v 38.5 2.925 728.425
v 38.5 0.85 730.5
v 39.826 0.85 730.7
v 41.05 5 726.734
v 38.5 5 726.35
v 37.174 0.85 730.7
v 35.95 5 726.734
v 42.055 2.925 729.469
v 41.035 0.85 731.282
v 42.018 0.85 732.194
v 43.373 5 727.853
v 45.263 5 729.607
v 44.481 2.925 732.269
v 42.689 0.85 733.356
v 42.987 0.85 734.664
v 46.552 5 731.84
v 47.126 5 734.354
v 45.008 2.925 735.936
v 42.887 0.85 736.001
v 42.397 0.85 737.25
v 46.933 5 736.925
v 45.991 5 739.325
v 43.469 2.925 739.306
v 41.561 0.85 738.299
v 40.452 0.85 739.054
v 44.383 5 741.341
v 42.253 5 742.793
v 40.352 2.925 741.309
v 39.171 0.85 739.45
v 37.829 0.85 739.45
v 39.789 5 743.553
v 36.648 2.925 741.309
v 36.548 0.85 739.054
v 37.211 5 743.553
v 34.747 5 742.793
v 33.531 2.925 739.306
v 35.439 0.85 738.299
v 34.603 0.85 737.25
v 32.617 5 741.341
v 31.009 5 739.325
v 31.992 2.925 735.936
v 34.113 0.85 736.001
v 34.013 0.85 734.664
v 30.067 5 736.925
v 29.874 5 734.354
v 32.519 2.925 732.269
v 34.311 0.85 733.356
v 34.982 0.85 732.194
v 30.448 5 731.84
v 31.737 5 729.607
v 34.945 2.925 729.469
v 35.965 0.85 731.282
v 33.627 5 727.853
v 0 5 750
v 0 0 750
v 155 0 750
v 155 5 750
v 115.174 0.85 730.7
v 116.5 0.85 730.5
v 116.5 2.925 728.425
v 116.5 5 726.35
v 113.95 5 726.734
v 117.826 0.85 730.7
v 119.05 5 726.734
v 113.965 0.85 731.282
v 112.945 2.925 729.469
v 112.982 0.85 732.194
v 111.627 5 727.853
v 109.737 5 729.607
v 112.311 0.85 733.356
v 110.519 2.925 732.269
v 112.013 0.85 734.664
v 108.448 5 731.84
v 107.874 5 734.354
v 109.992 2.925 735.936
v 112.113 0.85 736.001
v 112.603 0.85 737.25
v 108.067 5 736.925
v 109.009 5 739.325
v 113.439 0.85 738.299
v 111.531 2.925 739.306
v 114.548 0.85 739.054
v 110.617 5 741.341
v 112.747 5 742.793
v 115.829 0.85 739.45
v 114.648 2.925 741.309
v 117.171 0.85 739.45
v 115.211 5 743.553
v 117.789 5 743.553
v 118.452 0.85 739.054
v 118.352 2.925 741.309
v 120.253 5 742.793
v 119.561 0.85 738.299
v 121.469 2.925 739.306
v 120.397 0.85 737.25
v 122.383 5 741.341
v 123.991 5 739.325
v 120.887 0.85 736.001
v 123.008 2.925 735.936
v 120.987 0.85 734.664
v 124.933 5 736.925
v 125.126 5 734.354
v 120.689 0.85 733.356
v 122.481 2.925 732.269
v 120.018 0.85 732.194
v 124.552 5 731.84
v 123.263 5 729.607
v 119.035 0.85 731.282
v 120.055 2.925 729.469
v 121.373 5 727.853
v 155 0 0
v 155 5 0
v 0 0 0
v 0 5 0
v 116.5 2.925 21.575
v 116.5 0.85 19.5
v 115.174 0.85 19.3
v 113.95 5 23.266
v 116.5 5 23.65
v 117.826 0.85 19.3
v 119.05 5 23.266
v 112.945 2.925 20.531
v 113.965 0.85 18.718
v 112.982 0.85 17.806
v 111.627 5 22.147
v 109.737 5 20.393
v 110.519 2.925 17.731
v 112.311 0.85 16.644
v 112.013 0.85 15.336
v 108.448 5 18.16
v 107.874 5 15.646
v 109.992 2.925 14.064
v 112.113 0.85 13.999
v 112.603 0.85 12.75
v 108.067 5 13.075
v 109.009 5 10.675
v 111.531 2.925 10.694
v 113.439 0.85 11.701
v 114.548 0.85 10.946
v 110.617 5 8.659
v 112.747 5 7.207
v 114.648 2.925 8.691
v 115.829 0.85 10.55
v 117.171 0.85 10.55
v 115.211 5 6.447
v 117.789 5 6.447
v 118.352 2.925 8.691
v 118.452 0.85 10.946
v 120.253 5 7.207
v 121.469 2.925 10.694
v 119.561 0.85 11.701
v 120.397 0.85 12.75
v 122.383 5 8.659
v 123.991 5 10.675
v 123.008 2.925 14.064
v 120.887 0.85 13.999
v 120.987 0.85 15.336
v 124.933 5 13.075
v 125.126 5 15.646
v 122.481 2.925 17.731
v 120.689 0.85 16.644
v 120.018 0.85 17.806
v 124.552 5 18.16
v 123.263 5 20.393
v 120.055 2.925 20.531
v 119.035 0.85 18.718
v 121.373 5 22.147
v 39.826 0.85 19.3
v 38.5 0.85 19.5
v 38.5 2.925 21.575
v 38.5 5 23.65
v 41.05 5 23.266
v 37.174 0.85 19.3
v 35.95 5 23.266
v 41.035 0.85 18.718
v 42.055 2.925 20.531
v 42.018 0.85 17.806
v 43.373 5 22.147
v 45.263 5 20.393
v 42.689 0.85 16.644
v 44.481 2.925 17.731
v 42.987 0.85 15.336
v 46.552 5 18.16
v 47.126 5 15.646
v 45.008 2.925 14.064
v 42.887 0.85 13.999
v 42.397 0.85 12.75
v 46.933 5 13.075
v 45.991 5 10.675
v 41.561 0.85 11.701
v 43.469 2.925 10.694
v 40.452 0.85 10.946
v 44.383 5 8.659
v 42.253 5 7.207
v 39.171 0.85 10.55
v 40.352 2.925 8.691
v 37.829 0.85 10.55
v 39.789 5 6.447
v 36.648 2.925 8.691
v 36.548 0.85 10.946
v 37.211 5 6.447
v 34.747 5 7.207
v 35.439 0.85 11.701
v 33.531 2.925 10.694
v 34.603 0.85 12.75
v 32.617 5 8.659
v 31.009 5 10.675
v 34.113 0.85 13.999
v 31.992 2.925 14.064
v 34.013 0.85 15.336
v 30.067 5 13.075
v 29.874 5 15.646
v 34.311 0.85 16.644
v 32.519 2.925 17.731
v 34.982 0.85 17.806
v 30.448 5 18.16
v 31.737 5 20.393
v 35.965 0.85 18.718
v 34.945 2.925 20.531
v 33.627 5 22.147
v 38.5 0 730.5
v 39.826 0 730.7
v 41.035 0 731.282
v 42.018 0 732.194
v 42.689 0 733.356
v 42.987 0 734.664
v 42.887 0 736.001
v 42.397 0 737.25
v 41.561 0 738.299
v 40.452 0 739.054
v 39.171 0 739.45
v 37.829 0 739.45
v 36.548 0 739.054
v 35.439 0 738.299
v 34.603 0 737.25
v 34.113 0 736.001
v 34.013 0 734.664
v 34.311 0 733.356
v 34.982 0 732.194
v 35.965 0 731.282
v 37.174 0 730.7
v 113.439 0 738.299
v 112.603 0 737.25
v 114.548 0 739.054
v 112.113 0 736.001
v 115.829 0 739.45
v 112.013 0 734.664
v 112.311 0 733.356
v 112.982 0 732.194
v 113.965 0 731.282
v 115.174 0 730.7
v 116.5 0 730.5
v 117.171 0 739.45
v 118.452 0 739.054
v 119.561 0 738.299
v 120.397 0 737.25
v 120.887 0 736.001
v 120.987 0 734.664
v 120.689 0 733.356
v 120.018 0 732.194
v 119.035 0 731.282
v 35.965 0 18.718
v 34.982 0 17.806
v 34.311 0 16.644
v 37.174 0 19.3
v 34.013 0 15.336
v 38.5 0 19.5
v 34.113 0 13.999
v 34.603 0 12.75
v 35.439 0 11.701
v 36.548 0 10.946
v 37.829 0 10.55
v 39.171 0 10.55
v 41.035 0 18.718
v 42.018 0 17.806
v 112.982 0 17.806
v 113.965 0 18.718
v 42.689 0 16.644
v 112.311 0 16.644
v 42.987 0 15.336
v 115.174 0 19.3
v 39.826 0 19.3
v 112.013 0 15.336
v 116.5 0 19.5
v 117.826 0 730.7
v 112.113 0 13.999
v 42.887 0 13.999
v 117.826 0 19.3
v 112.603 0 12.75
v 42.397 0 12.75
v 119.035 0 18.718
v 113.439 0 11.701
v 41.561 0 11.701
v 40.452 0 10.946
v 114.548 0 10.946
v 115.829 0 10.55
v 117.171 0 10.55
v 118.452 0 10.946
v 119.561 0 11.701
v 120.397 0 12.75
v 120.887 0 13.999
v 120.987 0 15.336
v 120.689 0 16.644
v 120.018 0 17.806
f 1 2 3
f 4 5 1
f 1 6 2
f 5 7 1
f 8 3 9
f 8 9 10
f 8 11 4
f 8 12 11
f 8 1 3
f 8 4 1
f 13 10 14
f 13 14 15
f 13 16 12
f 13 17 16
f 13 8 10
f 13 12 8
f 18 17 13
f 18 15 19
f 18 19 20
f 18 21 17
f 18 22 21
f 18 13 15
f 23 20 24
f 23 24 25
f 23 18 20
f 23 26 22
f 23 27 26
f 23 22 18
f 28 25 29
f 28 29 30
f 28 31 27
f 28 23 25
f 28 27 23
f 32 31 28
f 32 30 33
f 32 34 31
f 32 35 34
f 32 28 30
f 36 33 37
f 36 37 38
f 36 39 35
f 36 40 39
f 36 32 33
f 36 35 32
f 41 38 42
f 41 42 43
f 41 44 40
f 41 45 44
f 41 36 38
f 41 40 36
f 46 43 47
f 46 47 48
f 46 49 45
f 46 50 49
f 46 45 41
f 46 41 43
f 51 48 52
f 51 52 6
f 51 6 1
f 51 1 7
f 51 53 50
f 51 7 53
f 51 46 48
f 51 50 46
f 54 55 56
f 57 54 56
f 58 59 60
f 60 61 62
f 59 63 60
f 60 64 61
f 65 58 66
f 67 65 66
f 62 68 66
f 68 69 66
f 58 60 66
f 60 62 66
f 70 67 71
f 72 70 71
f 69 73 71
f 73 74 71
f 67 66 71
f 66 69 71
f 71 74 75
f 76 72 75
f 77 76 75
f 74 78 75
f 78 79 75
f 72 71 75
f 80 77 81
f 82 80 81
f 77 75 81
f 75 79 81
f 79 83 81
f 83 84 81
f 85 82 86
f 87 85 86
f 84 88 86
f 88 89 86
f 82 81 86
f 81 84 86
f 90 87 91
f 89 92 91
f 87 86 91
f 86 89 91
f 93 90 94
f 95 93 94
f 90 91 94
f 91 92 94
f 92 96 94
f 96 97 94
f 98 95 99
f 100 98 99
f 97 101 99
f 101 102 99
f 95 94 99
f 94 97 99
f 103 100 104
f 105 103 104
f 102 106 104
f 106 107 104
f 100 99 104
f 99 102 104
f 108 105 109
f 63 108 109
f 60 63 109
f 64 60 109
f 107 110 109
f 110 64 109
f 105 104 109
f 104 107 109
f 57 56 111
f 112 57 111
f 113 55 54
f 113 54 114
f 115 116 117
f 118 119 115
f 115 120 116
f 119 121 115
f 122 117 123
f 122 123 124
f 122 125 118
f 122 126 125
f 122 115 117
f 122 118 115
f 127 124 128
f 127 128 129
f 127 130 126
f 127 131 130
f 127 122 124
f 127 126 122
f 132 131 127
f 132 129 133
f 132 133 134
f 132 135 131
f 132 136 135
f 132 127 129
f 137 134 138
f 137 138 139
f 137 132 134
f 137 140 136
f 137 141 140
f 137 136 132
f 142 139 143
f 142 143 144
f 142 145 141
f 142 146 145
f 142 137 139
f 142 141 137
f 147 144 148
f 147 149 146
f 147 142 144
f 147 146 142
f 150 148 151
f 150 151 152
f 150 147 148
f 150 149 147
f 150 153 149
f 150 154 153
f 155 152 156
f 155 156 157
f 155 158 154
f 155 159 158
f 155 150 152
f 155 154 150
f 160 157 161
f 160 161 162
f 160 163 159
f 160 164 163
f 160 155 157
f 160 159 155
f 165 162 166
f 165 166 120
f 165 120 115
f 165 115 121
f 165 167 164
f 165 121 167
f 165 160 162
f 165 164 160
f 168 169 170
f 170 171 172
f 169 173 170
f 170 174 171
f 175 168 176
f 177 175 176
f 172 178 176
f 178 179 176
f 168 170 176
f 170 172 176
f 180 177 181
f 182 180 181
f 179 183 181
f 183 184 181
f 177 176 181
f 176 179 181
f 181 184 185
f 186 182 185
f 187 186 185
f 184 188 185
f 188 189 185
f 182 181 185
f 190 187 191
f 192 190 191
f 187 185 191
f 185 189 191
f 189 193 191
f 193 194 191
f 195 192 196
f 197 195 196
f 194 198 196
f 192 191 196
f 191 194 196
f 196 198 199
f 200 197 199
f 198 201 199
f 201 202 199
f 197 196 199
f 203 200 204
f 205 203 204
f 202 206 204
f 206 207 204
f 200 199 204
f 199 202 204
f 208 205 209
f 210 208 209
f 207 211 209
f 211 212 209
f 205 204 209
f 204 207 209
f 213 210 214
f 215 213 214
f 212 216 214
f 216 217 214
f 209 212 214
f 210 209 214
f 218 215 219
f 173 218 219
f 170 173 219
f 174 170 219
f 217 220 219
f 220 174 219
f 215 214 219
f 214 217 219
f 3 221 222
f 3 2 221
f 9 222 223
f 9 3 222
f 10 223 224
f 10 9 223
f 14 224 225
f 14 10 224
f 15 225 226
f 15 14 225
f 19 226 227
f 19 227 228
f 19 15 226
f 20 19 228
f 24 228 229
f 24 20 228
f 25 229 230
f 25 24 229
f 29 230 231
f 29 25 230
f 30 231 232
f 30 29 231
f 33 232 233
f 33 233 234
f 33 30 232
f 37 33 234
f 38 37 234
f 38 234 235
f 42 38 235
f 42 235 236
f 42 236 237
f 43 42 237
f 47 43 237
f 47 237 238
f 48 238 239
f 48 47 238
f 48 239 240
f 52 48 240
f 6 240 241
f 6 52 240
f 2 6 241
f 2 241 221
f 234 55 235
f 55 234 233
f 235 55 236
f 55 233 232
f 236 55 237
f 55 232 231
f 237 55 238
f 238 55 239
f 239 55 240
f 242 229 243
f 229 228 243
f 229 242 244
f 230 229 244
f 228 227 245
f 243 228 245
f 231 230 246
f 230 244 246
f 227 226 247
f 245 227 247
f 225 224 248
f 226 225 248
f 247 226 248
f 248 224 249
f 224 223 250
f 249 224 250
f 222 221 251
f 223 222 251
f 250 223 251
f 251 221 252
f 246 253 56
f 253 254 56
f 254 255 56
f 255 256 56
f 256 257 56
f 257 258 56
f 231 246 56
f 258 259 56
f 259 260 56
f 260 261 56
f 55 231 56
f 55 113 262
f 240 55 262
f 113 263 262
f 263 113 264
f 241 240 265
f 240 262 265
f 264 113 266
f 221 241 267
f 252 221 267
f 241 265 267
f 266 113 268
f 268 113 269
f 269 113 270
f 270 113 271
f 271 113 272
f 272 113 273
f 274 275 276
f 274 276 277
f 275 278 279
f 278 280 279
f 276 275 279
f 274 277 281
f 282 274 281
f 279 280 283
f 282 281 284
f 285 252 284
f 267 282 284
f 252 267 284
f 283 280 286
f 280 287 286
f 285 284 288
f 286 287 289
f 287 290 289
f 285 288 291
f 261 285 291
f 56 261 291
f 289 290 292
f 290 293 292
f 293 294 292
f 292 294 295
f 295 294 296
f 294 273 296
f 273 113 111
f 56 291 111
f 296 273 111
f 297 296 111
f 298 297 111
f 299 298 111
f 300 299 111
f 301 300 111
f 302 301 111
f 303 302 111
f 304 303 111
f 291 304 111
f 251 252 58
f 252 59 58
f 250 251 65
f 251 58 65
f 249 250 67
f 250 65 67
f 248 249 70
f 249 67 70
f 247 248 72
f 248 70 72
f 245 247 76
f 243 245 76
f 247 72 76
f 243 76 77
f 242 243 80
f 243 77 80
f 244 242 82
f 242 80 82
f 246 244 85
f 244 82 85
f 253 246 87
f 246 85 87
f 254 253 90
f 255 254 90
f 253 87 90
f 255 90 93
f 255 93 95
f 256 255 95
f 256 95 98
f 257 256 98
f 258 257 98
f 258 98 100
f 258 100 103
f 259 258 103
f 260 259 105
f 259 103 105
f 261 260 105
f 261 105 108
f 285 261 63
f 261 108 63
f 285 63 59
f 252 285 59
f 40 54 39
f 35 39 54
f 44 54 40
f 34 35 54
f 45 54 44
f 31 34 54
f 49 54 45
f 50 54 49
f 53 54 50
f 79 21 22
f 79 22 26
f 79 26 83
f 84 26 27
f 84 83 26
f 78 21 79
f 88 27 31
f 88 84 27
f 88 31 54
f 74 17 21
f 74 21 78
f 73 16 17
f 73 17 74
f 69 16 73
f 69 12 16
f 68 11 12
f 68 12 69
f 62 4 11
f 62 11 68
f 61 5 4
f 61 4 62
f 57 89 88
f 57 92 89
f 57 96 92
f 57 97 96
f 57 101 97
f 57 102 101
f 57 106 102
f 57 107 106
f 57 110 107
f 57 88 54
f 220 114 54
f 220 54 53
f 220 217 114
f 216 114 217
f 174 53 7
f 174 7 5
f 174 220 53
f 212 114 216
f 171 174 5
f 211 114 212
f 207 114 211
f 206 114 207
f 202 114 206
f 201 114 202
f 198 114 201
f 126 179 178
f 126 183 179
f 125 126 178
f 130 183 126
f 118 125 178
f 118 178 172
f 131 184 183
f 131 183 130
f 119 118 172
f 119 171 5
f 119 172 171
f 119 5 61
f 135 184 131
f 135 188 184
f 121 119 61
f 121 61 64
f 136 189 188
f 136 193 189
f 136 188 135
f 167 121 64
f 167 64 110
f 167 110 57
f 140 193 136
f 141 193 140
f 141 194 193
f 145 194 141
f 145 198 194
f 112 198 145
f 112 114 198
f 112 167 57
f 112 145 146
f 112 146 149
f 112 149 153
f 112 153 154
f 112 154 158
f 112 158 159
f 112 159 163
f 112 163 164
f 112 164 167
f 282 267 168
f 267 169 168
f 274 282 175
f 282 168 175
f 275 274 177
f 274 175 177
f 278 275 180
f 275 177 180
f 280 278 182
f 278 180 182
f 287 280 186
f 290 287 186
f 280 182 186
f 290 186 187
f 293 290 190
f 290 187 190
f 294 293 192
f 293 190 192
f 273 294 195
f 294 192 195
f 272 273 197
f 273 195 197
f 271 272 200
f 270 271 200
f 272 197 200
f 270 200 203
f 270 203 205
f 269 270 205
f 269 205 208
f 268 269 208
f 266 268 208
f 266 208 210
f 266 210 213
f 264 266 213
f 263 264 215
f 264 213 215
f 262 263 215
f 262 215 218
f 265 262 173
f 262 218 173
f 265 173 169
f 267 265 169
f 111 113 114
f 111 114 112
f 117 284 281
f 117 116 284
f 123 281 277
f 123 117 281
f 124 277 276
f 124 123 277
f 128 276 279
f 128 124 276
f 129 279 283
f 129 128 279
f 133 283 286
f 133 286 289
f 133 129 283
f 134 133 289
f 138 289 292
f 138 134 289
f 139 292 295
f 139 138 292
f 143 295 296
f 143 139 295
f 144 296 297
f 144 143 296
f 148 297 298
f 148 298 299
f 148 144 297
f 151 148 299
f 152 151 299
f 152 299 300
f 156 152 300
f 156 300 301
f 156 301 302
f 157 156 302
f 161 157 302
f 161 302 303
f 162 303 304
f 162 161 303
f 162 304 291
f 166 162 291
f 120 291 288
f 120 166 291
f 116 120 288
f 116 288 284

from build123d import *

# Parameters (mm, degrees)
SKETCH1_W           = 155
SKETCH1_H           = 750
BOSS_EXTRUDE1_DEPTH = 5


with BuildPart() as part:
    # Sketch1 → Boss-Extrude1 (new body)
    with BuildSketch(Plane(origin=(0, 0, 0), x_dir=(1, 0, 0), z_dir=(0, 1, 0))):
        with Locations((77.5, -375)):
            Rectangle(SKETCH1_W, SKETCH1_H)
    extrude(amount=BOSS_EXTRUDE1_DEPTH)

    # Sketch24 → CSK for M8 Flat Head Machine Screw1 (revolve, cut)
    with BuildSketch(Plane(origin=(116.5, 5, 15), x_dir=(0, 0, 1), z_dir=(1, 0, 0))):
        Polygon((0, 0), (0, 5), (4.5, 5), (4.5, 4.15), (8.65, 0), align=None)
    csk_for_m8_flat_head_machine_screw1 = revolve(axis=Axis((116.5, 11.35, 15), (0, -1, 0)), mode=Mode.SUBTRACT)

    # Mirror1: CSK for M8 Flat Head Machine Screw1 across plane
    add(csk_for_m8_flat_head_machine_screw1.mirror(Plane(origin=(0, 0, 375), x_dir=(1, 0, 0), z_dir=(0, 0, -1))), mode=Mode.SUBTRACT)

    # Mirror2: CSK for M8 Flat Head Machine Screw1 across plane
    add(csk_for_m8_flat_head_machine_screw1.mirror(Plane(origin=(77.5, 0, 0), x_dir=(0, 0, 1), z_dir=(1, 0, 0))), mode=Mode.SUBTRACT)

    # Mirror2 copy 1 sketch → Mirror2 copy 1 (revolve, cut)
    with BuildSketch(Plane(origin=(38.5, 5, 735), x_dir=(0, 0, -1), z_dir=(-1, 0, 0))):
        Polygon((0, 0), (0, 5), (4.5, 5), (4.5, 4.15), (8.65, 0), align=None)
    revolve(axis=Axis((38.5, 11.35, 735), (0, -1, 0)), mode=Mode.SUBTRACT)


solid = part.part
